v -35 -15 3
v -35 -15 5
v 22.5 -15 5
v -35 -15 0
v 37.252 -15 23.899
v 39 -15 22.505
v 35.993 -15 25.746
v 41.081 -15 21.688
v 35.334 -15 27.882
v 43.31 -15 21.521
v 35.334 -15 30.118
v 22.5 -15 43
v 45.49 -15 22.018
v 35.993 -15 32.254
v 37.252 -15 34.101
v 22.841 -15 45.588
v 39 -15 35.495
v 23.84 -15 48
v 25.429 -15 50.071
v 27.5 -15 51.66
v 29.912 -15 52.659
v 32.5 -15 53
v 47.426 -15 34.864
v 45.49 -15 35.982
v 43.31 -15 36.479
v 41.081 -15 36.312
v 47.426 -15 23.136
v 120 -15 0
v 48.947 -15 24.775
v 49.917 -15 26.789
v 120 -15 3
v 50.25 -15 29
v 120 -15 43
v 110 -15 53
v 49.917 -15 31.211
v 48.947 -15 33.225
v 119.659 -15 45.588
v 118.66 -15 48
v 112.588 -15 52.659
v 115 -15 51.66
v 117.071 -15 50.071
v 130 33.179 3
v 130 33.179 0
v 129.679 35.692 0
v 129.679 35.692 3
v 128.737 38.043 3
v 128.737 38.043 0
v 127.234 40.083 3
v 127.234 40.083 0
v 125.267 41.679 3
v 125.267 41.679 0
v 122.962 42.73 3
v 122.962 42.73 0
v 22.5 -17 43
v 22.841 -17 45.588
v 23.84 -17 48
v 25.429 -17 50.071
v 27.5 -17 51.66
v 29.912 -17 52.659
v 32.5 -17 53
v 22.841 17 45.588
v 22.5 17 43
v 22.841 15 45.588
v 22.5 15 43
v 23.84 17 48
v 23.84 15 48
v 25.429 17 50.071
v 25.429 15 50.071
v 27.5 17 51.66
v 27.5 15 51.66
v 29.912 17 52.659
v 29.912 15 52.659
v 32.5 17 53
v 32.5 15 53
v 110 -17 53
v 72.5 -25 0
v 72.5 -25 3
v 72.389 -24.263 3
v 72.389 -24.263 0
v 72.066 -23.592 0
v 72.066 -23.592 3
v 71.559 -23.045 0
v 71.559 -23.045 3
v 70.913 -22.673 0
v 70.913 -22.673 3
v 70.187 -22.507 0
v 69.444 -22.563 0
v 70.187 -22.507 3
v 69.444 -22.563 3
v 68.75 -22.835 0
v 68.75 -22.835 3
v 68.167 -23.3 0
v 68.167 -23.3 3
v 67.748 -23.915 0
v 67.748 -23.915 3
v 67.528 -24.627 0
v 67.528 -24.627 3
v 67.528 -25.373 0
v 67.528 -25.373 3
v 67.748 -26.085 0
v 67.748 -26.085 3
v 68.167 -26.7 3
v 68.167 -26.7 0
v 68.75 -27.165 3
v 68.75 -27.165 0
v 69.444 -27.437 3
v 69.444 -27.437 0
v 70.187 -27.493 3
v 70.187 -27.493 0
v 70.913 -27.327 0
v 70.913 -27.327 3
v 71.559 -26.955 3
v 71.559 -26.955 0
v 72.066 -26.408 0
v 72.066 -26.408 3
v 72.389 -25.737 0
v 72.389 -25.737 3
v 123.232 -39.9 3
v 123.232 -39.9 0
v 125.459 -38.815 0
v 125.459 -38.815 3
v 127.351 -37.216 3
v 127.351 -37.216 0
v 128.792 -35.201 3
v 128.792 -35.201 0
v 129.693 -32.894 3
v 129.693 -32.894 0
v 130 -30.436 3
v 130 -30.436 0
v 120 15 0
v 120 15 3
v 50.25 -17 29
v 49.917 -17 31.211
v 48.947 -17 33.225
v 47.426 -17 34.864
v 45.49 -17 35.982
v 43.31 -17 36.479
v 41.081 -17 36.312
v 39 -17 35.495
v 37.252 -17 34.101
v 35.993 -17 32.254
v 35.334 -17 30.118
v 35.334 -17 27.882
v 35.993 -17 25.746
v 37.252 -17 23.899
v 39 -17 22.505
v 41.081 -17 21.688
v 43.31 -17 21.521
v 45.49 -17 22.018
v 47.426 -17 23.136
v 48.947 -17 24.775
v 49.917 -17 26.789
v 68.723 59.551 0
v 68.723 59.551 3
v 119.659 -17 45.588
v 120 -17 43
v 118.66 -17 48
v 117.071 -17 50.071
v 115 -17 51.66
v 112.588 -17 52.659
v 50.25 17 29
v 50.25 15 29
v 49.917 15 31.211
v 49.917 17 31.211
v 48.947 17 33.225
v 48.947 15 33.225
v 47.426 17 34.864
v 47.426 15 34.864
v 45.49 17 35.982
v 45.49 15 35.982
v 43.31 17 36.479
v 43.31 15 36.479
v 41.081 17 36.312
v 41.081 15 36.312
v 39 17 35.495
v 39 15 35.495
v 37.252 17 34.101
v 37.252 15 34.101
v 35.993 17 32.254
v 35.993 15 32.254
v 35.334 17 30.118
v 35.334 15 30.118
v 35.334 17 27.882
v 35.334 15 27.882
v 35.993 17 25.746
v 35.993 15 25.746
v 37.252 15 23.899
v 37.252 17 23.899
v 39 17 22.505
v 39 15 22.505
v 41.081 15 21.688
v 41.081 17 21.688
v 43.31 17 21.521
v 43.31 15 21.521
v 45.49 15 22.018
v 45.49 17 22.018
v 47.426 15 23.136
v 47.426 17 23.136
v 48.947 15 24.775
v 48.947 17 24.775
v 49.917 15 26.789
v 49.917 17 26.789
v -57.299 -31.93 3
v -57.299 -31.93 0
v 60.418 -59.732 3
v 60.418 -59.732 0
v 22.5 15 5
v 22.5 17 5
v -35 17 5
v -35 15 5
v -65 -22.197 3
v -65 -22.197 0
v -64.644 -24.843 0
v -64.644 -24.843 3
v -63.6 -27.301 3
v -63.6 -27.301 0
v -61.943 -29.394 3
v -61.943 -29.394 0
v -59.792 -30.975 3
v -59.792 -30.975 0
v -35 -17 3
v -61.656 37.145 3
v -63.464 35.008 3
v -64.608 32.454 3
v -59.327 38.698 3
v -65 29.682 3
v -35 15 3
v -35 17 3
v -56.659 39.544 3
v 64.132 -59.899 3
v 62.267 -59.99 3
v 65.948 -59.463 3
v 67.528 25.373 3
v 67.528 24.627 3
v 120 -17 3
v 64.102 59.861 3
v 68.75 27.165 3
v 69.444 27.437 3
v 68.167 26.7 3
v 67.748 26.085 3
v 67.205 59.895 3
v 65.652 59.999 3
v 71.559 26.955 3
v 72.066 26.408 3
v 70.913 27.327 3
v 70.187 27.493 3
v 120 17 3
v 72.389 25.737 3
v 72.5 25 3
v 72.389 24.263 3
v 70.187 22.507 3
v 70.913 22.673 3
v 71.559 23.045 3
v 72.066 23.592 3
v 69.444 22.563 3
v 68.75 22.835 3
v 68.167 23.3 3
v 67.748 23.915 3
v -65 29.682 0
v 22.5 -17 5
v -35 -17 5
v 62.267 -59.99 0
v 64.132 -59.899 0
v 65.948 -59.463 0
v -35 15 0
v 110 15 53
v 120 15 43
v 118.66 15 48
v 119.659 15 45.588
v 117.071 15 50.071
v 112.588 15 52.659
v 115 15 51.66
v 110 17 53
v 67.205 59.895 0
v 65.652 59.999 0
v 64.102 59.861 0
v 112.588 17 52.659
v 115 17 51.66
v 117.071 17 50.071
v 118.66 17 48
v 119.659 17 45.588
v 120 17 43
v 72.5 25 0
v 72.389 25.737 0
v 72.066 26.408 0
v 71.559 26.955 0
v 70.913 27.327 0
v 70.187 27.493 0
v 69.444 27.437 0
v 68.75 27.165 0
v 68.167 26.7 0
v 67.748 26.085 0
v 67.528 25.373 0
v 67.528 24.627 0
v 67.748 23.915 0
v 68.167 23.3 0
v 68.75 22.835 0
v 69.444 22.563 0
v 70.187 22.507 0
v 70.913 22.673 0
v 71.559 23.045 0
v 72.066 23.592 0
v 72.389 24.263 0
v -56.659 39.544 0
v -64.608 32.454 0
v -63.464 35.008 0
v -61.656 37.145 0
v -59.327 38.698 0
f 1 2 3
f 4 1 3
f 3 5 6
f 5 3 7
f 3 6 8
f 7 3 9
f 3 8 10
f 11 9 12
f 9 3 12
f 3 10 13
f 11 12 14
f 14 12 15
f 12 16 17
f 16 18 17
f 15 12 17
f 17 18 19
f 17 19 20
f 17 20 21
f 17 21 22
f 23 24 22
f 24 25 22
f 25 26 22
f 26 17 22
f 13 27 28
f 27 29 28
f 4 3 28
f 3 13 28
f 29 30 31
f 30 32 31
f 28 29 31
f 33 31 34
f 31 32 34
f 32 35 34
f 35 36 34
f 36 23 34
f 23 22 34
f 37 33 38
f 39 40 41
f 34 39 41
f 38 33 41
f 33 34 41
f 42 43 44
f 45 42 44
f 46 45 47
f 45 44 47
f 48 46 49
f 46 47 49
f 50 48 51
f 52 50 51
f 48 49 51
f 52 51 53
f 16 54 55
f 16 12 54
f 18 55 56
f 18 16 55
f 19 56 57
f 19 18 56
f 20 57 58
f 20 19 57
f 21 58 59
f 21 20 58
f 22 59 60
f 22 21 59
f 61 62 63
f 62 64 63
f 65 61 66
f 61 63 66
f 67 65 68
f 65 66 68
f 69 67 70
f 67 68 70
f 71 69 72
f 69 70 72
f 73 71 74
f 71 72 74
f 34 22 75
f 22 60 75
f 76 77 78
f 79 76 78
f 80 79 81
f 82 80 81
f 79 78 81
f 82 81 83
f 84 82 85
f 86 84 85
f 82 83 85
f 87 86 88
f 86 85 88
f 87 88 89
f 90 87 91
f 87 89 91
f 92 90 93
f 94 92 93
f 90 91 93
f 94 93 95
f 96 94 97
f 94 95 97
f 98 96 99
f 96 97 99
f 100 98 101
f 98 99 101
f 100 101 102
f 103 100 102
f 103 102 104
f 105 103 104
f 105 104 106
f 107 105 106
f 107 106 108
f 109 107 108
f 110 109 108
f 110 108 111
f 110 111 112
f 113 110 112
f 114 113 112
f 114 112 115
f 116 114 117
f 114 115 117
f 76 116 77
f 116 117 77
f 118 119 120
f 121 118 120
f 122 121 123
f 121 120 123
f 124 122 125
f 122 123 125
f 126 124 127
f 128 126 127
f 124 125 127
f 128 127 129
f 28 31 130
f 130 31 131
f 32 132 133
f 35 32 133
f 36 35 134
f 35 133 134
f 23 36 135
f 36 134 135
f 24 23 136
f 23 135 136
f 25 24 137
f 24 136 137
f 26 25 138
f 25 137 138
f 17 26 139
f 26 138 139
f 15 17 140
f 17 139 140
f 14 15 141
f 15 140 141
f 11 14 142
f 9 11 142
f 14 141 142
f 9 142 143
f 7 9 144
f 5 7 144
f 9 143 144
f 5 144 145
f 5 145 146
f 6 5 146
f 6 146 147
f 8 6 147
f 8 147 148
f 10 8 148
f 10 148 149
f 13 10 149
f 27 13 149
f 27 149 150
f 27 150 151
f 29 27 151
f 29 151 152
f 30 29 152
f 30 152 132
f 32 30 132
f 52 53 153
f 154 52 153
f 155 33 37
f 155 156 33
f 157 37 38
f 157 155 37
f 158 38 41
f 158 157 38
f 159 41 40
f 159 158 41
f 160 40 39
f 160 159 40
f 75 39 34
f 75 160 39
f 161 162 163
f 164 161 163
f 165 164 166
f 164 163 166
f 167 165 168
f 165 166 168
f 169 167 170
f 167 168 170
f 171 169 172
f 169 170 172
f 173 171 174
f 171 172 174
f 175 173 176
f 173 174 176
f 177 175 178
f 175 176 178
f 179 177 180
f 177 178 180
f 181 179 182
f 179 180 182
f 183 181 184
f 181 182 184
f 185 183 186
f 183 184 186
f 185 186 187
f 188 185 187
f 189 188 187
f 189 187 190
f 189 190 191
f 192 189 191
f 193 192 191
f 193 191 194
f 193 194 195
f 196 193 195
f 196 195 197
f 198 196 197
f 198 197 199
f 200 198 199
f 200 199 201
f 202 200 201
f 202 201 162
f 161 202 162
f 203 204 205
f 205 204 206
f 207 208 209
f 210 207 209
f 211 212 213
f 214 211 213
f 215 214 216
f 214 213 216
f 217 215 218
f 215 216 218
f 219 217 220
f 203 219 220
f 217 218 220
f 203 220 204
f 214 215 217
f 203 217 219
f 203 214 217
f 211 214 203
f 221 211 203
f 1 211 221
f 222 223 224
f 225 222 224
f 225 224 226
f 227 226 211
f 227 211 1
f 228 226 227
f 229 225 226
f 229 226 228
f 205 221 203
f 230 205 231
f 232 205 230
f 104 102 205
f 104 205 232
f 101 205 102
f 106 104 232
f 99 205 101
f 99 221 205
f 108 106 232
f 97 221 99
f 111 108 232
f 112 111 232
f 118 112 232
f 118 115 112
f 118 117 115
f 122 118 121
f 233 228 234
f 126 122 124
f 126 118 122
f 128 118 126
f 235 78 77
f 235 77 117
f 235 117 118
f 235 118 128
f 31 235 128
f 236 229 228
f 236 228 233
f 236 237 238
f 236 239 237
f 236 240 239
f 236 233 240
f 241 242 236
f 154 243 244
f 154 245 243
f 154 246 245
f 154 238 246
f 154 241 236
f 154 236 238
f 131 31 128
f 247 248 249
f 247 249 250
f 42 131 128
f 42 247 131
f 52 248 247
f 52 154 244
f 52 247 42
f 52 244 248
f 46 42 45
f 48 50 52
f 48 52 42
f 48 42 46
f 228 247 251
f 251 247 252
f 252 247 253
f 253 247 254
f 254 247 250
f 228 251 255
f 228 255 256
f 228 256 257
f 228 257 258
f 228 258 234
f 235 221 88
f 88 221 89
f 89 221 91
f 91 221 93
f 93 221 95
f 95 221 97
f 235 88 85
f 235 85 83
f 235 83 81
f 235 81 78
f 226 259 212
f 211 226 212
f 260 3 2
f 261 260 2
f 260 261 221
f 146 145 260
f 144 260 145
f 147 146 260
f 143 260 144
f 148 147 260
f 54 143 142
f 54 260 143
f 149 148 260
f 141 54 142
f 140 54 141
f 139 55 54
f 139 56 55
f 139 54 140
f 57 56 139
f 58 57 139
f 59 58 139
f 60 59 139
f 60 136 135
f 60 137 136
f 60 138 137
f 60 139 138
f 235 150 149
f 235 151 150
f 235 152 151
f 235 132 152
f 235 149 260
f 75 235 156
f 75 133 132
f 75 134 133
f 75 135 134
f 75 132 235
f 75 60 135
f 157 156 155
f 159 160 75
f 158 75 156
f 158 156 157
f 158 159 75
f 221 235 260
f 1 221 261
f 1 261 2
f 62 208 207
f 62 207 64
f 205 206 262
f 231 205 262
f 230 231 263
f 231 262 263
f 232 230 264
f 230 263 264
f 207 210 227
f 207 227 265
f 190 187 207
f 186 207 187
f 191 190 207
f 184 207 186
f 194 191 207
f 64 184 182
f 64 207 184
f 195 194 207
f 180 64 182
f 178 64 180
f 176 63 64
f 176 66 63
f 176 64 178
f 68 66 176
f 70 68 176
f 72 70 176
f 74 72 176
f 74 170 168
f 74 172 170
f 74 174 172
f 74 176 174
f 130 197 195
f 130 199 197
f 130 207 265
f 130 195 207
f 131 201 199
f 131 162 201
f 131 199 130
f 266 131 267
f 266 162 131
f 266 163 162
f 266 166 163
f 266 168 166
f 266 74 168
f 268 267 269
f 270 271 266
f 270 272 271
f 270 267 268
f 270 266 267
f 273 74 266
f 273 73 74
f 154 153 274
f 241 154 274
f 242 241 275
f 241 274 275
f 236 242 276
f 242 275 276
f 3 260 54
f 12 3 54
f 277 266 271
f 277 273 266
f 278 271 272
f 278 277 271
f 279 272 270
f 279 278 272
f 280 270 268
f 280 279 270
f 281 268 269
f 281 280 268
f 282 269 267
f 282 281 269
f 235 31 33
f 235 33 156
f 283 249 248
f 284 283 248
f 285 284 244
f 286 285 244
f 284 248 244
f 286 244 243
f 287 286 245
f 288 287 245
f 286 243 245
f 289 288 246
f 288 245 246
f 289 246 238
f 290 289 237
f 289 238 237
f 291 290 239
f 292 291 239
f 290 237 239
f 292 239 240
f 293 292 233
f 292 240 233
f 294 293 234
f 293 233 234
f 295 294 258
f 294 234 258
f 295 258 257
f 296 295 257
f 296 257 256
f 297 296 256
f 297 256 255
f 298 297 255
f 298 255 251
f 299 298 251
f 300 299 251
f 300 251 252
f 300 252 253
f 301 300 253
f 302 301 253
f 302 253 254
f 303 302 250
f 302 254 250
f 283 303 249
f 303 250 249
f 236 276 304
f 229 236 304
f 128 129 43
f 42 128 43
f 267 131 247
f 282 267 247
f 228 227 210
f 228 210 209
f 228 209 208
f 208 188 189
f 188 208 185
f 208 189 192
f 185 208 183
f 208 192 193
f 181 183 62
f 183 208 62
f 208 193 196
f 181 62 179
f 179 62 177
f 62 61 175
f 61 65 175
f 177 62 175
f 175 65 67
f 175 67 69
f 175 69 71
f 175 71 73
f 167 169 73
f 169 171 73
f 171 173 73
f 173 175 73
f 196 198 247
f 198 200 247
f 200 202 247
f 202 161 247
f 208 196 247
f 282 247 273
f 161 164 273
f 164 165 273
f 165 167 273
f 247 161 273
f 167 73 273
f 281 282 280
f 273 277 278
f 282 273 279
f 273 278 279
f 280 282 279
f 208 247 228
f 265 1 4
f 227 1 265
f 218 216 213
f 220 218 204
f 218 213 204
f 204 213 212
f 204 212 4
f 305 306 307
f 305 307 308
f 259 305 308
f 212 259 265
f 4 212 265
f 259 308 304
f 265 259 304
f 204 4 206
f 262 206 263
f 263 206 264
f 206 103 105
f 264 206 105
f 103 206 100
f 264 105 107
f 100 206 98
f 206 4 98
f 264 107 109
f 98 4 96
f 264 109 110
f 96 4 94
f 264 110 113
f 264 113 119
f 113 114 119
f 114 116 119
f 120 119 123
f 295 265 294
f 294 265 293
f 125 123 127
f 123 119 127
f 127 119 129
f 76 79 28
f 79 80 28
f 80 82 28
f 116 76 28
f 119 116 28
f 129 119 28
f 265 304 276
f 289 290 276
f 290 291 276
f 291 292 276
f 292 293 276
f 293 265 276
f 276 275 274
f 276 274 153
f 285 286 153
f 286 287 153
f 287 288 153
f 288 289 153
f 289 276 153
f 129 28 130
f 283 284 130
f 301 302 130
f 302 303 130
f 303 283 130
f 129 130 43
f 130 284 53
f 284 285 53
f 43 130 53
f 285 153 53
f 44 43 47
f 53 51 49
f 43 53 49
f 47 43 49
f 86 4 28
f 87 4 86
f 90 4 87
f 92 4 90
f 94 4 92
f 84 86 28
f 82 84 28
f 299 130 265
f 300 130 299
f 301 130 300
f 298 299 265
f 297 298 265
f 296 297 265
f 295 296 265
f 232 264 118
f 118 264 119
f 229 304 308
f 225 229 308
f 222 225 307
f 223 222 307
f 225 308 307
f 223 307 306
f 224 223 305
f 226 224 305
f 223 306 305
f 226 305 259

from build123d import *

# Parameters (mm, degrees)
SZKIC1_W                    = 260
SZKIC1_H                    = 150
DODANIE_WYCI_GNI_CIE1_DEPTH = 3
SZKIC2_R                    = 2.5
SZKIC2_W                    = 155
SZKIC2_H                    = 30
WYTNIJ_WYCI_GNI_CIE1_DEPTH  = 3
WYTNIJ_WYCI_GNI_CIE3_DEPTH  = 3
SZKIC6_W                    = 155
SZKIC6_H                    = 2
DODANIE_WYCI_GNI_CIE2_DEPTH = 5
SZKIC7_W                    = 77.5
SZKIC7_H                    = 2
DODANIE_WYCI_GNI_CIE3_DEPTH = 48
SZKIC10_W                   = 20
SZKIC10_H                   = 48
DODANIE_WYCI_GNI_CIE5_DEPTH = 2
SZKIC12_R                   = 7.5
WYTNIJ_WYCI_GNI_CIE4_DEPTH  = 40
ZAOKR_GLENIE1_R             = 10


with BuildPart() as part:
    # Szkic1 → Dodanie-wyciągnięcie1 (new body)
    with BuildSketch(Plane.XY):
        Rectangle(SZKIC1_W, SZKIC1_H)
    extrude(amount=DODANIE_WYCI_GNI_CIE1_DEPTH)

    # Szkic2 → Wytnij-wyciągnięcie1 (cut)
    with BuildSketch(Plane.XY.offset(3)):
        with Locations((70, 25)):
            Circle(SZKIC2_R)
        with Locations((70, -25)):
            Circle(SZKIC2_R)
        with Locations((42.5, 0)):
            Rectangle(SZKIC2_W, SZKIC2_H)
    extrude(amount=-WYTNIJ_WYCI_GNI_CIE1_DEPTH, mode=Mode.SUBTRACT)

    # Szkic4 → Wytnij-wyciągnięcie3 (cut)
    with BuildSketch(Plane(origin=(0, 0, 0), x_dir=(-1, 0, 0), z_dir=(0, 0, -1))):
        with BuildLine():
            ThreePointArc((-123.23193039, -39.89969852), (-128.133858368, -36.253613669), (-130, -30.436367925))
            Line((-130, -30.436367925), (-130, -75))
            Line((-130, -75), (130, -75))
            Line((130, -75), (130, 75))
            Line((130, 75), (-130, 75))
            Line((-130, 75), (-130, 33.178745855))
            ThreePointArc((-130, 33.178745855), (-128.050508227, 39.11080429), (-122.962136544, 42.729962902))
            Line((-122.962136544, 42.729962902), (-68.723094228, 59.551217048))
            ThreePointArc((-68.723094228, 59.551217048), (-66.430659203, 59.977549793), (-64.101812385, 59.861401365))
            Line((-64.101812385, 59.861401365), (56.659145299, 39.543804725))
            ThreePointArc((56.659145299, 39.543804725), (62.635163816, 36.140287961), (65, 29.682403361))
            Line((65, 29.682403361), (65, -22.197400037))
            ThreePointArc((65, -22.197400037), (62.841744534, -28.402804348), (57.298591466, -31.929639105))
            Line((57.298591466, -31.929639105), (-60.417650648, -59.732239068))
            ThreePointArc((-60.417650648, -59.732239068), (-63.201894591, -59.988200122), (-65.948172504, -59.463330595))
            Line((-65.948172504, -59.463330595), (-123.23193039, -39.89969852))
        make_face()
    extrude(amount=-WYTNIJ_WYCI_GNI_CIE3_DEPTH, mode=Mode.SUBTRACT)

    # Szkic6 → Dodanie-wyciągnięcie2 (add)
    with BuildSketch(Plane(origin=(0, 0, 0), x_dir=(-1, 0, 0), z_dir=(0, 0, -1))):
        with Locations((-42.5, 16)):
            Rectangle(SZKIC6_W, SZKIC6_H)
        with Locations((-42.5, -16)):
            Rectangle(SZKIC6_W, SZKIC6_H)
    extrude(amount=-DODANIE_WYCI_GNI_CIE2_DEPTH)

    # Szkic7 → Dodanie-wyciągnięcie3 (add)
    with BuildSketch(Plane.XY.offset(5)):
        with Locations((81.25, 16)):
            Rectangle(SZKIC7_W, SZKIC7_H)
    dodanie_wyci_gni_cie3 = extrude(amount=DODANIE_WYCI_GNI_CIE3_DEPTH)

    # Lustro2: Dodanie-wyciągnięcie3 across plane
    add(dodanie_wyci_gni_cie3.mirror(Plane.ZX))

    # Szkic10 → Dodanie-wyciągnięcie5 (add)
    with BuildSketch(Plane.XZ.offset(17)):
        with Locations((32.5, 29)):
            Rectangle(SZKIC10_W, SZKIC10_H)
    dodanie_wyci_gni_cie5 = extrude(amount=-DODANIE_WYCI_GNI_CIE5_DEPTH)

    # Lustro3: Dodanie-wyciągnięcie5 across plane
    add(dodanie_wyci_gni_cie5.mirror(Plane.ZX))

    # Szkic12 → Wytnij-wyciągnięcie4 (cut)
    with BuildSketch(Plane(origin=(0, -17, 0), x_dir=(-1, 0, 0), z_dir=(0, -1, 0))):
        with Locations(Location((-42.75, -29, 0), (0, 0, 180))):
            Circle(SZKIC12_R)
    extrude(amount=-WYTNIJ_WYCI_GNI_CIE4_DEPTH, mode=Mode.SUBTRACT)

    # Zaokrąglenie1
    zaokr_glenie1_edges = [part.edges().sort_by_distance(p)[0] for p in [
        (120, 16, 53),
        (120, -16, 53),
        (22.5, -16, 53),
        (22.5, 16, 53),
    ]]
    fillet(zaokr_glenie1_edges, radius=ZAOKR_GLENIE1_R)


solid = part.part
